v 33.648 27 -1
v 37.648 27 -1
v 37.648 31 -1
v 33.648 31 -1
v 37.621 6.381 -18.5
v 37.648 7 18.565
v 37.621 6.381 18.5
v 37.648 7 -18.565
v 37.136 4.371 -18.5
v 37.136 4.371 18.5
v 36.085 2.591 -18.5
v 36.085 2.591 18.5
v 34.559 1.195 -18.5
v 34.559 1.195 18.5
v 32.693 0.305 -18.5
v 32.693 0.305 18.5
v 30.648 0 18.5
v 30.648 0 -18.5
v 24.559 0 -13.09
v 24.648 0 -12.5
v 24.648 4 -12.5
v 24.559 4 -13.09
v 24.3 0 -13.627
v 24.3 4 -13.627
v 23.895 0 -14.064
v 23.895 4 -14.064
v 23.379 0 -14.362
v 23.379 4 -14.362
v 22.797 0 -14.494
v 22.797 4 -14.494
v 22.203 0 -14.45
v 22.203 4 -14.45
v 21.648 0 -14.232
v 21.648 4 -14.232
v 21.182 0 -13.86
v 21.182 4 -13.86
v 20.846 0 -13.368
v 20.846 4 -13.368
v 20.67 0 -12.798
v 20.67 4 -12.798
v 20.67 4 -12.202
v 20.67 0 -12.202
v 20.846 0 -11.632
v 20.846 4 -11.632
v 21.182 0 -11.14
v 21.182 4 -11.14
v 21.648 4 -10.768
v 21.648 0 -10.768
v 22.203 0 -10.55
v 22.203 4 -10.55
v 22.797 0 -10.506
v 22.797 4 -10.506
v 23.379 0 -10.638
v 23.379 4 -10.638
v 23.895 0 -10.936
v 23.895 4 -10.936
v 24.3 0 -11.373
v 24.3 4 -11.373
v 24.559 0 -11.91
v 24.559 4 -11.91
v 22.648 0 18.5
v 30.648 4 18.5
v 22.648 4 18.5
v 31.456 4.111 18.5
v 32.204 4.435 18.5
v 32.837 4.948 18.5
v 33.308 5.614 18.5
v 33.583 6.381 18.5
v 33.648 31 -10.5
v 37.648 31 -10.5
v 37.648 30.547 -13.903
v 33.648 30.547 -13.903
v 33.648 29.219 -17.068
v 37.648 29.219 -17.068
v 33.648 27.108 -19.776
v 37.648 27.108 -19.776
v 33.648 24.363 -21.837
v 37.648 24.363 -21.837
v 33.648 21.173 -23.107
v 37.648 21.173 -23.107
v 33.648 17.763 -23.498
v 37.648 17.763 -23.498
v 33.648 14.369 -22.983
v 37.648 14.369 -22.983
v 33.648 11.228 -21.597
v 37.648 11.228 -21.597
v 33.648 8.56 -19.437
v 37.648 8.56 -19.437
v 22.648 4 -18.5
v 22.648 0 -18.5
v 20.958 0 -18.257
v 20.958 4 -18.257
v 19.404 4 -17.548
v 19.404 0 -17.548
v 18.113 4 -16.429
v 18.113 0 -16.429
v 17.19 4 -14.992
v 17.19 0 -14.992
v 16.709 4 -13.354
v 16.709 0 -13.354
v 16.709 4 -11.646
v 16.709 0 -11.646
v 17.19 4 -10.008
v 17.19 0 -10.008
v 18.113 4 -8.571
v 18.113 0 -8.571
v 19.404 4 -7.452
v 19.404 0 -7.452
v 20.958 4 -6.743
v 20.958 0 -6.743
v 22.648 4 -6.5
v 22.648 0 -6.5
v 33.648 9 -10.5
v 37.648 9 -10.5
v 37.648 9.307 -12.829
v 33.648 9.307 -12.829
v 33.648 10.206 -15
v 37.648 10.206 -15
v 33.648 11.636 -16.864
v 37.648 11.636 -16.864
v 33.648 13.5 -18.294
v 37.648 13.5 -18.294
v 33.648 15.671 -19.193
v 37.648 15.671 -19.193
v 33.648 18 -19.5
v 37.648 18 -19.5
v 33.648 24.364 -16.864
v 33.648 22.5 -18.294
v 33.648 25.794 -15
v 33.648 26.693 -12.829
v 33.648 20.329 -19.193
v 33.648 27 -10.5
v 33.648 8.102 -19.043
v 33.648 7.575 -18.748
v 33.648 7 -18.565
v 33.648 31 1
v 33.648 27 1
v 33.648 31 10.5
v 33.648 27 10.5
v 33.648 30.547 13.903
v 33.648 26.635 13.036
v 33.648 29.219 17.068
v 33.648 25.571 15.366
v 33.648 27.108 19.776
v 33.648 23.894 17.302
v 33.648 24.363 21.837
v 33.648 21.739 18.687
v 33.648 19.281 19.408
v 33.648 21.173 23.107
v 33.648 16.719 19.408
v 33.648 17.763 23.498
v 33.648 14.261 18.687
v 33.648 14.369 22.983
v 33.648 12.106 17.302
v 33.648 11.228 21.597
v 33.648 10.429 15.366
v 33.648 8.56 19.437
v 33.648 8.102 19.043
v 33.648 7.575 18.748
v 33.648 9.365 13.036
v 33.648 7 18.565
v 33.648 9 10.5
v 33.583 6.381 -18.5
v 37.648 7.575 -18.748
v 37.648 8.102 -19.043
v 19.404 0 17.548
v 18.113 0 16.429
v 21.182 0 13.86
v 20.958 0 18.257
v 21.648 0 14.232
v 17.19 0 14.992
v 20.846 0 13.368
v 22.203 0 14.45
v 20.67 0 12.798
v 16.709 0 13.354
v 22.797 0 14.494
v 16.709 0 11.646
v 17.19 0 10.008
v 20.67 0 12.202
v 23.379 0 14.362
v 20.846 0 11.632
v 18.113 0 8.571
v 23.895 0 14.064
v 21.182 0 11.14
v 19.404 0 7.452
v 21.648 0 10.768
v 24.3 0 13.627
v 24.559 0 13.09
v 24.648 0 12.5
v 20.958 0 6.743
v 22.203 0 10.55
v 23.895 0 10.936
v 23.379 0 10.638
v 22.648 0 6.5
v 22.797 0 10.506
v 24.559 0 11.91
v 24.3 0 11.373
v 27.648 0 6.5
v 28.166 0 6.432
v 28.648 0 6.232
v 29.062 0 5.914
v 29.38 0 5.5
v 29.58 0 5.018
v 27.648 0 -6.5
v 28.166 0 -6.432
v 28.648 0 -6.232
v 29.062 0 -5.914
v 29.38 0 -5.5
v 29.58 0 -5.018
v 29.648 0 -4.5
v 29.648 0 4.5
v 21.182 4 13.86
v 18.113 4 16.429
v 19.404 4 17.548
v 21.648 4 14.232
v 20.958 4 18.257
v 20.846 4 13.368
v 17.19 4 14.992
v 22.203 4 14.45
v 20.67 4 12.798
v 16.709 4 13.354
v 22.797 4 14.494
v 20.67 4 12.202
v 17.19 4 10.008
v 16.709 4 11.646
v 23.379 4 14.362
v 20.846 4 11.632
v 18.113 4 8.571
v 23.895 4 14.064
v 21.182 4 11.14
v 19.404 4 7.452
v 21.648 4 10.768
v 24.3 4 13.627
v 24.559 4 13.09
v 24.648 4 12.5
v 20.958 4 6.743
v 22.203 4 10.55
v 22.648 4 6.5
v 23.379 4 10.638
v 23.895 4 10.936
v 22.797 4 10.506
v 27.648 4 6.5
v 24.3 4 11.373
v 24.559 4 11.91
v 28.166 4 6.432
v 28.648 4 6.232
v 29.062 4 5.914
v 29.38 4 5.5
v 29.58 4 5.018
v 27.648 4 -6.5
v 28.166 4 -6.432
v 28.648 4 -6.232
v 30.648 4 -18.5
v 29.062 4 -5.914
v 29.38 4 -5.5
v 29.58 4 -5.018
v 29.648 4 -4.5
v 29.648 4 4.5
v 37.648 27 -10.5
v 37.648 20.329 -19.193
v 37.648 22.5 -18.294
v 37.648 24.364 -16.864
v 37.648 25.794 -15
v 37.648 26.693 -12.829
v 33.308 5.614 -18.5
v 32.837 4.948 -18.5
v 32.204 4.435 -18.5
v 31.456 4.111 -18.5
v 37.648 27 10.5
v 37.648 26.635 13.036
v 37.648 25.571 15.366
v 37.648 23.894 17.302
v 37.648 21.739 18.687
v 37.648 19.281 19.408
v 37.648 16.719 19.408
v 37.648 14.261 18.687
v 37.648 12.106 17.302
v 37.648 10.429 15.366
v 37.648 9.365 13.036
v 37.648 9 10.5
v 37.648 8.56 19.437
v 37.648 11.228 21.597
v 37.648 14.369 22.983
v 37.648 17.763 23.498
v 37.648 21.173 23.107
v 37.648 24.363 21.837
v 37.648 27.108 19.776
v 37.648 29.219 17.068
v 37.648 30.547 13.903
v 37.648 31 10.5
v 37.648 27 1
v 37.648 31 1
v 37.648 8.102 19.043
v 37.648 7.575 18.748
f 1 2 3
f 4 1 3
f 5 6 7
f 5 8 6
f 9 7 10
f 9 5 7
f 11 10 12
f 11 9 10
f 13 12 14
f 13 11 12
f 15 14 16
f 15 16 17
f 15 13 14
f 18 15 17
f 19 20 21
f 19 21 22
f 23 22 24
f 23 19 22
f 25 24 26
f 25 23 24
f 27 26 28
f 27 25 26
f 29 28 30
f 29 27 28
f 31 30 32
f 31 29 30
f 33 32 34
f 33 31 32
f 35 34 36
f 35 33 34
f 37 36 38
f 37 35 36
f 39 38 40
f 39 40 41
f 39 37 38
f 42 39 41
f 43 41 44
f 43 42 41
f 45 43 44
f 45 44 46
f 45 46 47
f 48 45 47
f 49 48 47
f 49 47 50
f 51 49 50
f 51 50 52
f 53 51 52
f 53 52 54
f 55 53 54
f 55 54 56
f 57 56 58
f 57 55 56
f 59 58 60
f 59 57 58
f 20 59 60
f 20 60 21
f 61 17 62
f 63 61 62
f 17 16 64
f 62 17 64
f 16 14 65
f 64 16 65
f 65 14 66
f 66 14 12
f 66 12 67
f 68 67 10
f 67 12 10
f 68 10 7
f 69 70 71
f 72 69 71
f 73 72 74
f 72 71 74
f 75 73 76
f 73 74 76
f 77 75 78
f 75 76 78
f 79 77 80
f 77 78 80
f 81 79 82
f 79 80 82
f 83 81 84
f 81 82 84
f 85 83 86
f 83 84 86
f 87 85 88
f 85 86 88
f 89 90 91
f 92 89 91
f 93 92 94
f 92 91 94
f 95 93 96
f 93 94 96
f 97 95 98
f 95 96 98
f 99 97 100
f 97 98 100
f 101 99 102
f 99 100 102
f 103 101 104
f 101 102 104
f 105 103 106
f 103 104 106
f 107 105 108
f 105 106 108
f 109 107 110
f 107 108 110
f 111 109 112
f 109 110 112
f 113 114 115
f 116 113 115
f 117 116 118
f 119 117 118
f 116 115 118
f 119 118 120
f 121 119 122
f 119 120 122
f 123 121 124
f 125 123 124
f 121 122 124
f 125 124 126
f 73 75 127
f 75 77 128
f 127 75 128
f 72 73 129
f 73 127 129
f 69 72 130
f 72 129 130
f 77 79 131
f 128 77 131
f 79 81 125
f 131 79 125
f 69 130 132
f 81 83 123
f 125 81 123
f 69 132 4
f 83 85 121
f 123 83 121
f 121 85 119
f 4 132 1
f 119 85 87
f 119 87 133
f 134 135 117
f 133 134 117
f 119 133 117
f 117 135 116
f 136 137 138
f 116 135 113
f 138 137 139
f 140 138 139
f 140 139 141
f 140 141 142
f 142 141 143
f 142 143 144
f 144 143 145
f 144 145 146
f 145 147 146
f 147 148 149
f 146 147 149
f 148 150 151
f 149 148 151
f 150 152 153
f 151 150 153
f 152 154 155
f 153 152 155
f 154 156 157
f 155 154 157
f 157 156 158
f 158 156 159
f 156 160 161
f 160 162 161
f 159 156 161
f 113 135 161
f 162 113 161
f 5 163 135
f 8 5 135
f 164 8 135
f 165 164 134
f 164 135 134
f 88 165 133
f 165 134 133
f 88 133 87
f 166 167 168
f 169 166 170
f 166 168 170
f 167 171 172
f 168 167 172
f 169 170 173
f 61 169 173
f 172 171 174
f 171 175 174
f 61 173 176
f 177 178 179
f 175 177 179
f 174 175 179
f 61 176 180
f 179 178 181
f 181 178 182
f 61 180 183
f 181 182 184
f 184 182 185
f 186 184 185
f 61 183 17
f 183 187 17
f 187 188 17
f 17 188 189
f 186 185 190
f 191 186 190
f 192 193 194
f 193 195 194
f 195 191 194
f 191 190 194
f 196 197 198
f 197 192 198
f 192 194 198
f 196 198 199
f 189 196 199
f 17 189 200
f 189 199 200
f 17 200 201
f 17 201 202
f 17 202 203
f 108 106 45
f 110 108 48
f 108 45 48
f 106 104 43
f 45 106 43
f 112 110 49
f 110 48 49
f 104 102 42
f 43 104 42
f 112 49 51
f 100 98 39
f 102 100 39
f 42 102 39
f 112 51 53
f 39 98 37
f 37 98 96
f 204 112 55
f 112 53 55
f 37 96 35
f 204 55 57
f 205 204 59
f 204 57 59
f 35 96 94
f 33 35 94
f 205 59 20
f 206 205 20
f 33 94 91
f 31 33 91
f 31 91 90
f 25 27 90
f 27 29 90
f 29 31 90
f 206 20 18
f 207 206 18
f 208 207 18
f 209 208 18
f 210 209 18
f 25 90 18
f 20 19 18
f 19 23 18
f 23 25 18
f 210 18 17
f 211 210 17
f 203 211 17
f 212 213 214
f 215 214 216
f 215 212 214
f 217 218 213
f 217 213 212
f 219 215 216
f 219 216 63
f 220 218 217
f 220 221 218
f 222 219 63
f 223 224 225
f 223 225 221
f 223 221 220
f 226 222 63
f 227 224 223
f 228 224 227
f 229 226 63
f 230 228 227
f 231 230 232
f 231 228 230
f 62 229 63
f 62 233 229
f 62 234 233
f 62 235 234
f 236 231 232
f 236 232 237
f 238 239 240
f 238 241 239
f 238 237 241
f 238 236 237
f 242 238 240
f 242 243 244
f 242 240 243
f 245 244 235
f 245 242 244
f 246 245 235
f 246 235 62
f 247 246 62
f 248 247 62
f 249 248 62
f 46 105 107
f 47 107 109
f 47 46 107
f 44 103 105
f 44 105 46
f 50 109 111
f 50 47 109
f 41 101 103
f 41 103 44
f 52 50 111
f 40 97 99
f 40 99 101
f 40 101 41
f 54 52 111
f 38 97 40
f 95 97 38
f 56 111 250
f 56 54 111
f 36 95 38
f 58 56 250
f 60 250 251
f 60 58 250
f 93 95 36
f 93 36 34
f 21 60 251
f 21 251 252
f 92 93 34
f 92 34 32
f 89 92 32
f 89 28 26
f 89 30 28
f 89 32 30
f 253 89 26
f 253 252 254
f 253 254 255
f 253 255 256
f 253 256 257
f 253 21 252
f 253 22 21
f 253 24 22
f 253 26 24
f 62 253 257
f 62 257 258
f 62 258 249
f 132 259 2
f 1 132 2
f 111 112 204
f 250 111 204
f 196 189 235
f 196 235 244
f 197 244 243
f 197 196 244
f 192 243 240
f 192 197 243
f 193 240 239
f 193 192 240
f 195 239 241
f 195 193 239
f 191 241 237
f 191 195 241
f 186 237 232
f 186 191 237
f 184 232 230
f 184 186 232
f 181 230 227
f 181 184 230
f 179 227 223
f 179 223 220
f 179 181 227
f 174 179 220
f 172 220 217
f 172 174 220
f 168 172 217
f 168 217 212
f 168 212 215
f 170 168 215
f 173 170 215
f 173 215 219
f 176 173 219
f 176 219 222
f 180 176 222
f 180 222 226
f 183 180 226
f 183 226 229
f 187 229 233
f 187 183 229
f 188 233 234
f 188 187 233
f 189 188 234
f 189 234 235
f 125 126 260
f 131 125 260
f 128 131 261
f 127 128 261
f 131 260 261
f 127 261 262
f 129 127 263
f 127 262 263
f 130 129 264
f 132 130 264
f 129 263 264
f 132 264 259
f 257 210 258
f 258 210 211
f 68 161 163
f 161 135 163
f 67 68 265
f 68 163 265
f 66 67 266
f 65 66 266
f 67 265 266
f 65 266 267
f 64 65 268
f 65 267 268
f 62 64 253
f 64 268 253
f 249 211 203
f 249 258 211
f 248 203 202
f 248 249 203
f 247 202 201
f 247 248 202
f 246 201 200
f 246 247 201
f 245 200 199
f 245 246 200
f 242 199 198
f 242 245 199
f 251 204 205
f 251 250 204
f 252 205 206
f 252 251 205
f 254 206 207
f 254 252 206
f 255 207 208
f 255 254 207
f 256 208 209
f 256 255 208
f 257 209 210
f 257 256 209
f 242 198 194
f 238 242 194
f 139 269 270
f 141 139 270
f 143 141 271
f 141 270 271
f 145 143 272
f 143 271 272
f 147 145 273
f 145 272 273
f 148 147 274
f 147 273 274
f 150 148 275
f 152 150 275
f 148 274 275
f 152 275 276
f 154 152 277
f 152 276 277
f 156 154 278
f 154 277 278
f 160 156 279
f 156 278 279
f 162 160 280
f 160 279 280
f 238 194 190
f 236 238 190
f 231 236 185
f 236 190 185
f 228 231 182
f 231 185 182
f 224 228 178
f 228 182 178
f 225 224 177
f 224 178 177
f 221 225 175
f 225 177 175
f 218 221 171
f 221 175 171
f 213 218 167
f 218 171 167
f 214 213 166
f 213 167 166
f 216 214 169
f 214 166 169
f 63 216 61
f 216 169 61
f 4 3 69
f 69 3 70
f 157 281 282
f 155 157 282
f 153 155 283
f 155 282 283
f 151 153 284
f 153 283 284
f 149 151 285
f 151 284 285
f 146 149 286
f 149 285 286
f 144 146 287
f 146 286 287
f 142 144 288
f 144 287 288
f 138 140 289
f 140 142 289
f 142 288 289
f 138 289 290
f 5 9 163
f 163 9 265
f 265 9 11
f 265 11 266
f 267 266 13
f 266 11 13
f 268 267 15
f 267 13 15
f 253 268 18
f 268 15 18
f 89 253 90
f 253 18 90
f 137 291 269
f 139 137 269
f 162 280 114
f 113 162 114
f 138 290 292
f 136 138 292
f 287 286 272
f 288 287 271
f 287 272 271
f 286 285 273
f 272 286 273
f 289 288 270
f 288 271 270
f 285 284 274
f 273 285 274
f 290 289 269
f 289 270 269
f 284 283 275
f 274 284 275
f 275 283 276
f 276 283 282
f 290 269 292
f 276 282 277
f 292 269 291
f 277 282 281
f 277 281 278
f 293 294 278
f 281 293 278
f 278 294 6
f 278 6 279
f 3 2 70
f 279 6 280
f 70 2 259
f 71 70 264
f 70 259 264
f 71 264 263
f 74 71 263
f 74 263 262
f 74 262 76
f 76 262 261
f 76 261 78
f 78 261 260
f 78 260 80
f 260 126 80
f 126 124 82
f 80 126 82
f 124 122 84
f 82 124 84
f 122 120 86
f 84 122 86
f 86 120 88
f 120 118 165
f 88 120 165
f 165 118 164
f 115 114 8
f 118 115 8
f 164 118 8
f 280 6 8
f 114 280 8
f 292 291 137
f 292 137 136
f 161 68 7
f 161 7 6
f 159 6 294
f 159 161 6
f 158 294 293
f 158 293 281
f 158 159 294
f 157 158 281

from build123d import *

# Parameters (mm, degrees)
SKETCH1_R           = 2
BOSS_EXTRUDE1_DEPTH = 4
SKETCH1_3_W         = 4
SKETCH1_3_H         = 56
BOSS_EXTRUDE2_DEPTH = 35
FILLET3_R           = 2
CUT_EXTRUDE2_DEPTH  = 10
SKETCH4_W           = 2
SKETCH4_H           = 8.349248205
CUT_EXTRUDE3_DEPTH  = 10
FILLET4_R           = 3
FILLET6_R           = 3
FILLET5_R           = 7


with BuildPart() as part:
    # Sketch1 → Boss-Extrude1 (new body)
    with BuildSketch(Plane(origin=(0, 0, 0), x_dir=(1, 0, 0), z_dir=(0, 1, 0))):
        with BuildLine():
            Line((33.647984737, 18.5), (22.647984737, 18.5))
            ThreePointArc((22.647984737, 18.5), (16.647984737, 12.5), (22.647984737, 6.5))
            Line((22.647984737, 6.5), (29.647984737, 6.5))
            Line((29.647984737, 6.5), (29.647984737, -6.5))
            Line((29.647984737, -6.5), (22.647984737, -6.5))
            ThreePointArc((22.647984737, -6.5), (16.647984737, -12.5), (22.647984737, -18.5))
            Line((22.647984737, -18.5), (33.647984737, -18.5))
            Line((33.647984737, -18.5), (33.647984737, 18.5))
        make_face()
        with Locations((22.647984737, 12.5)):
            Circle(SKETCH1_R, mode=Mode.SUBTRACT)
        with Locations((22.647984737, -12.5)):
            Circle(SKETCH1_R, mode=Mode.SUBTRACT)
    extrude(amount=BOSS_EXTRUDE1_DEPTH)

    # Sketch1<3> → Boss-Extrude2 (add)
    with BuildSketch(Plane(origin=(0, 0, 0), x_dir=(1, 0, 0), z_dir=(0, 1, 0))):
        with Locations((35.647984737, 0)):
            Rectangle(SKETCH1_3_W, SKETCH1_3_H)
    extrude(amount=BOSS_EXTRUDE2_DEPTH)

    # Fillet3
    fillet3_edges = [part.edges().sort_by_distance(p)[0] for p in [
        (29.647984737, 2, -6.5),
        (29.647984737, 2, 6.5),
    ]]
    fillet(fillet3_edges, radius=FILLET3_R)

    # Sketch3 → Cut-Extrude2 (cut)
    with BuildSketch(Plane(origin=(37.647984737, 0, 0), x_dir=(0, 0, -1), z_dir=(1, 0, 0))):
        with BuildLine():
            Line((-28, 0), (-18.5, 0))
            Line((-18.5, 0), (-18.5, 7.753049234))
            ThreePointArc((-18.5, 7.753049234), (-22.792484695, 22.230226947), (-10.5, 31))
            Line((-10.5, 31), (10.5, 31))
            ThreePointArc((10.5, 31), (22.792484695, 22.230226947), (18.5, 7.753049234))
            Line((18.5, 7.753049234), (18.5, 0))
            Line((18.5, 0), (28, 0))
            Line((28, 0), (28, 35))
            Line((28, 35), (-28, 35))
            Line((-28, 35), (-28, 0))
        make_face()
        with BuildLine():
            Line((-10.5, 9), (10.5, 9))
            ThreePointArc((10.5, 9), (19.5, 18), (10.5, 27))
            Line((10.5, 27), (-10.5, 27))
            ThreePointArc((-10.5, 27), (-19.5, 18), (-10.5, 9))
        make_face()
    extrude(amount=-CUT_EXTRUDE2_DEPTH, mode=Mode.SUBTRACT)

    # Sketch4 → Cut-Extrude3 (cut)
    with BuildSketch(Plane(origin=(37.647984737, 0, 0), x_dir=(0, 0, -1), z_dir=(1, 0, 0))):
        with Locations((0, 31.174624103)):
            Rectangle(SKETCH4_W, SKETCH4_H)
    extrude(amount=-CUT_EXTRUDE3_DEPTH, mode=Mode.SUBTRACT)

    # Fillet4
    fillet4_edges = [part.edges().sort_by_distance(p)[0] for p in [
        (35.647984737, 7.753049234, -18.5),
        (35.647984737, 7.753049234, 18.5),
    ]]
    fillet(fillet4_edges, radius=FILLET4_R)

    # Fillet6
    fillet6_edges = [part.edges().sort_by_distance(p)[0] for p in [
        (33.647984737, 4, 0),
    ]]
    fillet(fillet6_edges, radius=FILLET6_R)

    # Fillet5
    fillet5_edges = [part.edges().sort_by_distance(p)[0] for p in [
        (37.647984737, 0, 0),
    ]]
    fillet(fillet5_edges, radius=FILLET5_R)


solid = part.part
